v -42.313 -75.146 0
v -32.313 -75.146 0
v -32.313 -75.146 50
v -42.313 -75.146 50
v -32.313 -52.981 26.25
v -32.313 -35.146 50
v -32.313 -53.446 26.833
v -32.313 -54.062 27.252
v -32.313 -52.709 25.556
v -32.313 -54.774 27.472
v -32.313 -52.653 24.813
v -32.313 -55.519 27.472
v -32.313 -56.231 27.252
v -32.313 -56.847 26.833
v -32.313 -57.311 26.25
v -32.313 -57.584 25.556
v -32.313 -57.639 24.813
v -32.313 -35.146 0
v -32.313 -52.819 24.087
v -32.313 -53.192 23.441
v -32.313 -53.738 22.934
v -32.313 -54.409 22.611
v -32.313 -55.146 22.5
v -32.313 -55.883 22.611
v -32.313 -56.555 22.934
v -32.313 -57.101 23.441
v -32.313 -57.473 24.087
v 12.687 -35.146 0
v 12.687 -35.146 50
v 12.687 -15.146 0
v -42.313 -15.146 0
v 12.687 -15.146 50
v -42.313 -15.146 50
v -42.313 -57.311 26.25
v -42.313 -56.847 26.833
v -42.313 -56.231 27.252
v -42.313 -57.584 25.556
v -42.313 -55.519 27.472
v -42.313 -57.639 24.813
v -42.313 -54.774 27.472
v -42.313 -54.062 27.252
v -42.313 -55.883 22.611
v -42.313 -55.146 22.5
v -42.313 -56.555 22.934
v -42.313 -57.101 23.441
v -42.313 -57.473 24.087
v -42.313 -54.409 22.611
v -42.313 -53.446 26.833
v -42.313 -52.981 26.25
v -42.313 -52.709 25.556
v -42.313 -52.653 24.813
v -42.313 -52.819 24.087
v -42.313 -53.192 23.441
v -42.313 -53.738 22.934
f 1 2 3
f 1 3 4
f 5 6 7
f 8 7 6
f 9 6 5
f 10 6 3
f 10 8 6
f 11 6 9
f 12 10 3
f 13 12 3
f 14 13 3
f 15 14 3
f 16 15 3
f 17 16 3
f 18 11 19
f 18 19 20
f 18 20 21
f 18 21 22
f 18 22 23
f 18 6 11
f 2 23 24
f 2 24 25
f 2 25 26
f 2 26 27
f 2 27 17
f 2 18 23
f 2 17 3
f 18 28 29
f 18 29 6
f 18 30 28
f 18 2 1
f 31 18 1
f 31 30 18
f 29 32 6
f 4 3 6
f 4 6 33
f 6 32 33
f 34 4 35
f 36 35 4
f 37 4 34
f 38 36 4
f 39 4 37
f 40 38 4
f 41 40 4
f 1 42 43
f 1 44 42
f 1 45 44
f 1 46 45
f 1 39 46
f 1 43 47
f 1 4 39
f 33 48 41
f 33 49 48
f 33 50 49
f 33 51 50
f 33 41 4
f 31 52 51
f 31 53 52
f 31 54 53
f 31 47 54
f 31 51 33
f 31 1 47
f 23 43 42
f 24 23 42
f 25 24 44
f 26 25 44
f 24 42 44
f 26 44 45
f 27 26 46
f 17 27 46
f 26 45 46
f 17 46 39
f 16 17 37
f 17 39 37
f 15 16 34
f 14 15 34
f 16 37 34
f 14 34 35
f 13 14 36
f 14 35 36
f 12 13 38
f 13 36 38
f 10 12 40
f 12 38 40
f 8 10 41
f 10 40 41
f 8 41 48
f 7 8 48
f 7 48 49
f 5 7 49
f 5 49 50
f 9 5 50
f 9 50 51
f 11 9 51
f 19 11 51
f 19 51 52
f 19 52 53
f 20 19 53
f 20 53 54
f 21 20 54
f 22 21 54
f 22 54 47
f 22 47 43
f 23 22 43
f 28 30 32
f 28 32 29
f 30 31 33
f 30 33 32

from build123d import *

# Parameters (mm, degrees)
SALIENTE_EXTRUIR1_DEPTH                        = 50
PERFORADOR_PARA_ROSCAR_PARA_MACHO_DE_ROS_D     = 5
PERFORADOR_PARA_ROSCAR_PARA_MACHO_DE_ROS_DEPTH = 11
PERFORADOR_PARA_ROSCAR_PARA_MACHO_DE_ROS_TIP   = 1.502151548


with BuildPart() as part:
    # Croquis1 → Saliente-Extruir1 (new body)
    with BuildSketch(Plane.XY):
        Polygon((-42.31300039, -15.146269262), (12.68699961, -15.146269262), (12.68699961, -35.146269262), (-32.31300039, -35.146269262), (-32.31300039, -75.146269262), (-42.31300039, -75.146269262), align=None)
    extrude(amount=SALIENTE_EXTRUIR1_DEPTH)

    # Perforador para roscar para macho de roscar para M6x1.01
    with Locations(Plane(origin=(-32.31300039, -55.146269262, 25), x_dir=(0, 0, 1), z_dir=(1, 0, 0))):
        with Locations((0, 0)):
            Hole(PERFORADOR_PARA_ROSCAR_PARA_MACHO_DE_ROS_D / 2, depth=PERFORADOR_PARA_ROSCAR_PARA_MACHO_DE_ROS_DEPTH)
            with Locations((0, 0, -(PERFORADOR_PARA_ROSCAR_PARA_MACHO_DE_ROS_DEPTH + PERFORADOR_PARA_ROSCAR_PARA_MACHO_DE_ROS_TIP / 2))):  # 118° drill point
                Cone(0, PERFORADOR_PARA_ROSCAR_PARA_MACHO_DE_ROS_D / 2, PERFORADOR_PARA_ROSCAR_PARA_MACHO_DE_ROS_TIP, mode=Mode.SUBTRACT)


solid = part.part
